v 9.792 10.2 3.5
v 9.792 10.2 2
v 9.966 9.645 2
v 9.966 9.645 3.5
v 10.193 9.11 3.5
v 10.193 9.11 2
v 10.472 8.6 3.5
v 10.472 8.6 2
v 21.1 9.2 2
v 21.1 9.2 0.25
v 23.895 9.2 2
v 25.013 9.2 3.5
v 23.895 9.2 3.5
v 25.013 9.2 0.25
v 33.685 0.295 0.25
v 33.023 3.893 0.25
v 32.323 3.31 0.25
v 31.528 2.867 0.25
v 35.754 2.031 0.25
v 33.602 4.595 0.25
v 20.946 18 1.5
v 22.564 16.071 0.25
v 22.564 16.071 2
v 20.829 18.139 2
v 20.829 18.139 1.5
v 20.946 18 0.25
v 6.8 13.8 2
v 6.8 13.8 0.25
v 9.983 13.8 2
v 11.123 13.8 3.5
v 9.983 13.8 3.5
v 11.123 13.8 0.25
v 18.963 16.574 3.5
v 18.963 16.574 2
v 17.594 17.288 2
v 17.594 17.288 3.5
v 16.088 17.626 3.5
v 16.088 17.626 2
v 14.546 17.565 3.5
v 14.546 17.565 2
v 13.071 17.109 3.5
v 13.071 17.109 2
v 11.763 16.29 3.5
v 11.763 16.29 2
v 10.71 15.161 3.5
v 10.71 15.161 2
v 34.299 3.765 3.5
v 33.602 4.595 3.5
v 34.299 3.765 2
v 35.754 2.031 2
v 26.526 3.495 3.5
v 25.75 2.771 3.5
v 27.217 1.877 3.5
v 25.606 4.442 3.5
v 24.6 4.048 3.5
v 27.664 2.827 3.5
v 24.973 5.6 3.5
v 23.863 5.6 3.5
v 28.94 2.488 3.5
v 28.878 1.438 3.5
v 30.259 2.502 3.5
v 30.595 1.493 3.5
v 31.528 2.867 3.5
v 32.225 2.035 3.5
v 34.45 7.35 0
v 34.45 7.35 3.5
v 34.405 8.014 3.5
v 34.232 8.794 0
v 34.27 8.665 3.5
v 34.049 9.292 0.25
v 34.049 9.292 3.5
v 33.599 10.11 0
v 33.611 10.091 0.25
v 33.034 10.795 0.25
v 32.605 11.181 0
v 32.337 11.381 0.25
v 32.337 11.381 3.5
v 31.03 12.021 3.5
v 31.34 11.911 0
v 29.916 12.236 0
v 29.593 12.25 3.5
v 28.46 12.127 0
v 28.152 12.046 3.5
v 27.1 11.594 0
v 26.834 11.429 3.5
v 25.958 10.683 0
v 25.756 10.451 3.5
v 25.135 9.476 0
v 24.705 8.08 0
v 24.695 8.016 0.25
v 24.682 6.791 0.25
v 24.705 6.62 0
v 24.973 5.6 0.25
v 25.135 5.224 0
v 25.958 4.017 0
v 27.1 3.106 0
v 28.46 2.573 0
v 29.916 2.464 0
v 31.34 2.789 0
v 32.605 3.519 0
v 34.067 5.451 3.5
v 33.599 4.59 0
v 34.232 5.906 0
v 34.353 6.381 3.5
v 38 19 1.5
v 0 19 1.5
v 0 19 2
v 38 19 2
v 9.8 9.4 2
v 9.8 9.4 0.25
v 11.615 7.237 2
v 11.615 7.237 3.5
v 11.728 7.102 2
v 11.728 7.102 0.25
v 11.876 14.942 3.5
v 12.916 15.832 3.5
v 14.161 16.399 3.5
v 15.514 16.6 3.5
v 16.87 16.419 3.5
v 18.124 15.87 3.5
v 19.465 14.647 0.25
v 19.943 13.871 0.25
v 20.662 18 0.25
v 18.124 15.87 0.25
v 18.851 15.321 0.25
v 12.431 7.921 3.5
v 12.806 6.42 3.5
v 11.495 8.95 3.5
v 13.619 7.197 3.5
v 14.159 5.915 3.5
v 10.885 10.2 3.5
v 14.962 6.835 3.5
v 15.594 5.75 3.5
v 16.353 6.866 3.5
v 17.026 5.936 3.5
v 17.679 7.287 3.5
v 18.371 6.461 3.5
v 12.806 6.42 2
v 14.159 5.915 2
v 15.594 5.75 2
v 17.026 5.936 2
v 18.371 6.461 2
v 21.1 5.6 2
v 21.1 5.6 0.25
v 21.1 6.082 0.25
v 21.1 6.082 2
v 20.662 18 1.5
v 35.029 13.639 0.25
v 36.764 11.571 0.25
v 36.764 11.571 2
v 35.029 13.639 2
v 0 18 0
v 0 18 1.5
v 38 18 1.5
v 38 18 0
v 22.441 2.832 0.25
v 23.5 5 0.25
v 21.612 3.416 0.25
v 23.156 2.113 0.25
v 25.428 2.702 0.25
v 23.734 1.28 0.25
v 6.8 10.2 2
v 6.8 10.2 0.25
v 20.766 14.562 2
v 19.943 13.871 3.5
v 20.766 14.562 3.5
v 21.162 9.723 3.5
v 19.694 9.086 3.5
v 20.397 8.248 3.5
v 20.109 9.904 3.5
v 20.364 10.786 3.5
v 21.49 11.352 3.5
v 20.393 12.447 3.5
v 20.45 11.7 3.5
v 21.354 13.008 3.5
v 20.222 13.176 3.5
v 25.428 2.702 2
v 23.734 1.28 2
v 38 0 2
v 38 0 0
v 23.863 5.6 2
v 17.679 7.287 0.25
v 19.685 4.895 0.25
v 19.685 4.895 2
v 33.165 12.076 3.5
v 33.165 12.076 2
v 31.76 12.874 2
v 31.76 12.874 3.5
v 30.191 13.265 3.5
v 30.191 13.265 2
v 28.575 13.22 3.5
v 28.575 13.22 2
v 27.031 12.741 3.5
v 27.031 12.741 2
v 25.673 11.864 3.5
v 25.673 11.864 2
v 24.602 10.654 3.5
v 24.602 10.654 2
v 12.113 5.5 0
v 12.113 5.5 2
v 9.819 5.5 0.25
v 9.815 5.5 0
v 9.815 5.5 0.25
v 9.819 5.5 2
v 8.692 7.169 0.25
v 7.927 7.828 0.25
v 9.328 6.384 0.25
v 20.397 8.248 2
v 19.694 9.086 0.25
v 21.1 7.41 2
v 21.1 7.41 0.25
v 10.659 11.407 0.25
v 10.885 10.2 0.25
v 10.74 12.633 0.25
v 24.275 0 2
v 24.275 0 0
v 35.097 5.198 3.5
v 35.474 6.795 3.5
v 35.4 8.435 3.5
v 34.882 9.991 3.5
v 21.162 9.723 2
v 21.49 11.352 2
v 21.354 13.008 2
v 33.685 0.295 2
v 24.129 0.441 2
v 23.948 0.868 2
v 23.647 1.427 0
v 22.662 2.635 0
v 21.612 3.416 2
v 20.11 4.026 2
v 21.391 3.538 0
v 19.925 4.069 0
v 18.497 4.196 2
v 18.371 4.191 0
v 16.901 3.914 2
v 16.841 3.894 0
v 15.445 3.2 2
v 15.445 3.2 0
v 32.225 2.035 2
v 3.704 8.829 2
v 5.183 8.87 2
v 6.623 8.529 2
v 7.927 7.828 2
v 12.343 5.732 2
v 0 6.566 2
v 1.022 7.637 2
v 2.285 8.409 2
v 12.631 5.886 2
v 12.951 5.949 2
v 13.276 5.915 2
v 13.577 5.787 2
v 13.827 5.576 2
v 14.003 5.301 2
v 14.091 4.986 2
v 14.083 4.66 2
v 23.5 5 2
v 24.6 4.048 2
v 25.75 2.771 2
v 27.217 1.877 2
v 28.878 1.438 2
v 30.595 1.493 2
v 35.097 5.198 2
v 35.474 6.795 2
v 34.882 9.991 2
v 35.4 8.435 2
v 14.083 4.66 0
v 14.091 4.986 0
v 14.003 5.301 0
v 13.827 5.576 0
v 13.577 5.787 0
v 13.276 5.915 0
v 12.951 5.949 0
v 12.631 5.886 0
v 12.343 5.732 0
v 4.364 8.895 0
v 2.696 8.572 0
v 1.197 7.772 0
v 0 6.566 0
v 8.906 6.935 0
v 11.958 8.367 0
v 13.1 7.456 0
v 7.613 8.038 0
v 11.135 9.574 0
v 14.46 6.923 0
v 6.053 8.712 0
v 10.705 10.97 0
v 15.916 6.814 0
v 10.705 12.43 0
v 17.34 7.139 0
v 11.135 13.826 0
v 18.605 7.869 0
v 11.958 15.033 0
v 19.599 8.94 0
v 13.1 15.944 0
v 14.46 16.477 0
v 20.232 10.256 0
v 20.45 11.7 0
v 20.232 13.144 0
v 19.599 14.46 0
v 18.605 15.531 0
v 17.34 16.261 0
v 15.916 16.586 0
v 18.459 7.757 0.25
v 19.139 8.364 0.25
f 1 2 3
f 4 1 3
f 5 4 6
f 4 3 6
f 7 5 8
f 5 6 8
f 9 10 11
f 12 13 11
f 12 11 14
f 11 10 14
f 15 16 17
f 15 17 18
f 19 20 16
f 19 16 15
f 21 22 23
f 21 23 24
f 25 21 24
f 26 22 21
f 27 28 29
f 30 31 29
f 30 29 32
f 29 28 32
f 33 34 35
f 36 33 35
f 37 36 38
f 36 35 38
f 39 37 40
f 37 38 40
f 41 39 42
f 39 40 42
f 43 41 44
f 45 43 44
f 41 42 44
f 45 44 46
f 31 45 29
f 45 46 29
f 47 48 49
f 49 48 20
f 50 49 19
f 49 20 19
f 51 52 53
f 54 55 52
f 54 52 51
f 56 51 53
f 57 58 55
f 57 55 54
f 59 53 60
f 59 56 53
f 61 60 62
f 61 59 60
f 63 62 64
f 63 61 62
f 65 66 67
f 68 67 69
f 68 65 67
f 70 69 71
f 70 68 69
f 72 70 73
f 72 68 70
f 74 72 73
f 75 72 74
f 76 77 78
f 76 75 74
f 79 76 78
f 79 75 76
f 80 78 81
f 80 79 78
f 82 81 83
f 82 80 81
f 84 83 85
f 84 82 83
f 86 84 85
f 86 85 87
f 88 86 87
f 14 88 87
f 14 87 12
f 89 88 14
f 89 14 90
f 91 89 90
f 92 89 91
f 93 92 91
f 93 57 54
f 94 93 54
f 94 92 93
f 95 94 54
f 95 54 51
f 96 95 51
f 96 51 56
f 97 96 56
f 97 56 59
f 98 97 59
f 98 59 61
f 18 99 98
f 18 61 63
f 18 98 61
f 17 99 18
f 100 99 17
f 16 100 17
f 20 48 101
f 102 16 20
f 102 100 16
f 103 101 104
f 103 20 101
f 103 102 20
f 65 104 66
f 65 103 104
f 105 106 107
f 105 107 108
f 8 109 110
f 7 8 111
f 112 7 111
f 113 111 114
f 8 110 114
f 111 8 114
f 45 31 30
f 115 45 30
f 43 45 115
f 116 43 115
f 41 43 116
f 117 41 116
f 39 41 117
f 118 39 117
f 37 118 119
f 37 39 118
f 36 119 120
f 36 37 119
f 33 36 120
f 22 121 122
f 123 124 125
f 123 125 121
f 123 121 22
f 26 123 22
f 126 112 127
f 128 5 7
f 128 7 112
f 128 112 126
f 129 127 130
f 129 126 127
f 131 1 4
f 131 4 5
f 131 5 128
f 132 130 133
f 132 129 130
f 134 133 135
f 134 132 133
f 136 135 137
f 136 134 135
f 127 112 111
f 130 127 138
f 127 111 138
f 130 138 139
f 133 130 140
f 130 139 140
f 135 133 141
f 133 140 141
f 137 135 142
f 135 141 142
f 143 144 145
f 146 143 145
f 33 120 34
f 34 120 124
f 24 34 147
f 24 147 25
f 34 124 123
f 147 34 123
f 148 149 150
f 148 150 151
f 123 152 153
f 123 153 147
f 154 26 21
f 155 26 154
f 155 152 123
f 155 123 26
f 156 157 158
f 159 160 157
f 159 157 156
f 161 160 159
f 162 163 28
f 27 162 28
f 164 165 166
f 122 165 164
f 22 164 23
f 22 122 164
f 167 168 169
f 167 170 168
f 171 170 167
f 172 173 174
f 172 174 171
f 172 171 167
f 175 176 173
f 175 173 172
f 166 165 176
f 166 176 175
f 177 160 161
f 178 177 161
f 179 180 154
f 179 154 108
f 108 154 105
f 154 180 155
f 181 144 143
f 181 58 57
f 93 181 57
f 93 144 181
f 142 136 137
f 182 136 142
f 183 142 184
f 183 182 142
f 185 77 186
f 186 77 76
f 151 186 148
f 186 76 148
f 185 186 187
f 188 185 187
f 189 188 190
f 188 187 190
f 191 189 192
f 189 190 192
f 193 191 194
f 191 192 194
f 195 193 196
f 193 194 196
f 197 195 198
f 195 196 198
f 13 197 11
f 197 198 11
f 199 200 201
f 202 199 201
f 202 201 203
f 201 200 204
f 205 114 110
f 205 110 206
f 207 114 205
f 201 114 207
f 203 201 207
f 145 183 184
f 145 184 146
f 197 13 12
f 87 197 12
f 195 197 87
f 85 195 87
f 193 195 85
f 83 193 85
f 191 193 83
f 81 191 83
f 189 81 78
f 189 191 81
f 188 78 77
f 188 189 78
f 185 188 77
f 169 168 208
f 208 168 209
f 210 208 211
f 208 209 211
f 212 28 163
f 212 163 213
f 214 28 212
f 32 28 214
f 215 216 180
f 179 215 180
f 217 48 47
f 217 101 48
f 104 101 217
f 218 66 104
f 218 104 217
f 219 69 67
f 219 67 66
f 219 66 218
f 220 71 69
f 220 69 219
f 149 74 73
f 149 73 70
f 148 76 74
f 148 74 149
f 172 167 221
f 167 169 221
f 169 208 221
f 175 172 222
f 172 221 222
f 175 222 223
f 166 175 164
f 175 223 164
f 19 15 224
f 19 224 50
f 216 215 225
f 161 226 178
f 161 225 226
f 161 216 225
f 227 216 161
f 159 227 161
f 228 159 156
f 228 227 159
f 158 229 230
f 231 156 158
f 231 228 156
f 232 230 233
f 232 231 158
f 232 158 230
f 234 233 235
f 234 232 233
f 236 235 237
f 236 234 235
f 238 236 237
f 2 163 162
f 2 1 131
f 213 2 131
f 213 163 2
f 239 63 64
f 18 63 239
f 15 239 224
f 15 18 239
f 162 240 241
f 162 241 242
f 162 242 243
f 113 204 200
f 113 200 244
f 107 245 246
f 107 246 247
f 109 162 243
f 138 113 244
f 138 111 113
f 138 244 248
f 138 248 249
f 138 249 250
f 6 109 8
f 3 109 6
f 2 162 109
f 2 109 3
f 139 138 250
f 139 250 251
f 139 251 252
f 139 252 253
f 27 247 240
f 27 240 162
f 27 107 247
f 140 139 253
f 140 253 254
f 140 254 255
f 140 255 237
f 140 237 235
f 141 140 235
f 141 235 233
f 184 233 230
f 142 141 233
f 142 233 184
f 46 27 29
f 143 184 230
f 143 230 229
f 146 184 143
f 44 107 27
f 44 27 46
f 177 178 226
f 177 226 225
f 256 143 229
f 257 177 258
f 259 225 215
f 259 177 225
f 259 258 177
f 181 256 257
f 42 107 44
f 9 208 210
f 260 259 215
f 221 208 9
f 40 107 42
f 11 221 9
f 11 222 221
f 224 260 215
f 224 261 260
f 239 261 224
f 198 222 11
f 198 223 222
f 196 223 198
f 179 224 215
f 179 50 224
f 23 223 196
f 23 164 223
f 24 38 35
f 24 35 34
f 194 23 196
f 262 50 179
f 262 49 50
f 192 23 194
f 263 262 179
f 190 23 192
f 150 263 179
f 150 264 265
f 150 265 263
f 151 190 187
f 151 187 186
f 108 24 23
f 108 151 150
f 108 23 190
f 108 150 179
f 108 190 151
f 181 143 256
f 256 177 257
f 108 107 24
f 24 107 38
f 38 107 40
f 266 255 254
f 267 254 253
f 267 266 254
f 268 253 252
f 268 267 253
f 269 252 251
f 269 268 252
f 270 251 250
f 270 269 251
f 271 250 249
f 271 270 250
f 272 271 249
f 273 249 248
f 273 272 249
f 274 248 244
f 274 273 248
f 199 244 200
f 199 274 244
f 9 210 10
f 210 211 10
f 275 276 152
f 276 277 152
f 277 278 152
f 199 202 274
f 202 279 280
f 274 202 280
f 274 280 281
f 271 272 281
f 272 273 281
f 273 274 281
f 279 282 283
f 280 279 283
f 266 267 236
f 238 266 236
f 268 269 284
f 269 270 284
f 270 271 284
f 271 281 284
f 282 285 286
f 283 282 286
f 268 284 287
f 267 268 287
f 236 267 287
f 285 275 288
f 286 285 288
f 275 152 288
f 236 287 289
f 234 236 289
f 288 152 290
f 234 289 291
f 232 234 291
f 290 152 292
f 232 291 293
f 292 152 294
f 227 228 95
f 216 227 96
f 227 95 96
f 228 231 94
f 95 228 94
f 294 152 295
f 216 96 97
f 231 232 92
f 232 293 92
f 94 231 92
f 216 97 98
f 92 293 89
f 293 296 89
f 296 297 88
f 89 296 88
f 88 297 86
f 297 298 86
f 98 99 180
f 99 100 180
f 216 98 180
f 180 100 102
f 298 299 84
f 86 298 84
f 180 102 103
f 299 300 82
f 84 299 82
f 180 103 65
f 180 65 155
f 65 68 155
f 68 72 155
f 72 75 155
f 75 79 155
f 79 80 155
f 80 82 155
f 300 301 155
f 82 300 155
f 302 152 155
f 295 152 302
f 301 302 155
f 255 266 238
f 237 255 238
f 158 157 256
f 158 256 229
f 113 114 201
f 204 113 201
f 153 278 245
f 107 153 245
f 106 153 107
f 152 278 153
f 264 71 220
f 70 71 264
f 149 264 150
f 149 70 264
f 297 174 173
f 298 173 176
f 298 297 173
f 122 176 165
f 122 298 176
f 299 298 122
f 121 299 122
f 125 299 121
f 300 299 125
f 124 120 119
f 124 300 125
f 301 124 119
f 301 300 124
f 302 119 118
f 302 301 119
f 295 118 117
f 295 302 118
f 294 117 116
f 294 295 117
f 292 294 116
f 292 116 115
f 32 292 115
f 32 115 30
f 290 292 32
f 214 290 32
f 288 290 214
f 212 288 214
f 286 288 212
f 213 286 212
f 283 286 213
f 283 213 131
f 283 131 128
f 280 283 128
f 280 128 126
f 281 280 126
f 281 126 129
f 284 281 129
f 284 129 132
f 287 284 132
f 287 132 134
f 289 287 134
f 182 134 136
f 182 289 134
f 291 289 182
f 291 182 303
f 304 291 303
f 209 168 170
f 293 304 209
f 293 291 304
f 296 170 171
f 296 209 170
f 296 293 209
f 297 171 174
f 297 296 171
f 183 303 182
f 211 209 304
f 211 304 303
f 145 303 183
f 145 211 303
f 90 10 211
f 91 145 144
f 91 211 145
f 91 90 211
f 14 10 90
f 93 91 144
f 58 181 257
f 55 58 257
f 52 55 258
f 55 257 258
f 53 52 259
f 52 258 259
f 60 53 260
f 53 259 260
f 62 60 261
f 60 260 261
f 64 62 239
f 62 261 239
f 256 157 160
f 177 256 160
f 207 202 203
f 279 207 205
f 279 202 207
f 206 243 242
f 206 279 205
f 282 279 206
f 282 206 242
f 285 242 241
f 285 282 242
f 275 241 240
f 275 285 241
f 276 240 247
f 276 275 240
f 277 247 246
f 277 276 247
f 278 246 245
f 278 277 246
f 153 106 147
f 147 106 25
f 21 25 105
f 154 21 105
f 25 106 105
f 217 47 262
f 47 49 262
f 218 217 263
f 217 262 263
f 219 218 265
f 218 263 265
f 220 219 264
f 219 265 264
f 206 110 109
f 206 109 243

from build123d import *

# Parameters (mm, degrees)
CYLINDER009_R          = 1.1
CYLINDER009_DEPTH      = 10
CYLINDER008_W          = 7
CYLINDER008_H          = 10
CYLINDER008_ANGLE      = 133
BOX008_W               = 4.5
BOX008_H               = 3.6
BOX008_DEPTH           = 10
BOX009_W               = 4.5
BOX009_H               = 3.6
BOX009_DEPTH           = 10
BOX005_W               = 3.4
BOX005_H               = 2.7
BOX005_DEPTH           = 3.5
BOX005_PLACEMENT_ANGLE = 50
BOX006_W               = 4
BOX006_H               = 2.7
BOX006_DEPTH           = 3.5
BOX006_PLACEMENT_ANGLE = 40
BOX004_W               = 3
BOX004_H               = 3
BOX004_DEPTH           = 3.5
BOX004_PLACEMENT_ANGLE = 220
BOX003_W               = 3
BOX003_H               = 3
BOX003_DEPTH           = 3.5
BOX003_PLACEMENT_ANGLE = 220
BOX001_W               = 3.4
BOX001_H               = 2.7
BOX001_DEPTH           = 3.5
BOX001_PLACEMENT_ANGLE = 50
BOX002_W               = 4
BOX002_H               = 2.7
BOX002_DEPTH           = 3.5
BOX002_PLACEMENT_ANGLE = 40
CYLINDER003_R          = 4.9
CYLINDER003_DEPTH      = 10
CYLINDER002_R          = 5.8
CYLINDER002_DEPTH      = 10
CYLINDER001_R          = 4.9
CYLINDER001_DEPTH      = 10
CYLINDER_R             = 5.7
CYLINDER_DEPTH         = 10
BOX007_W               = 38
BOX007_H               = 2
BOX007_DEPTH           = 1.5
CYLINDER004_R          = 5.95
CYLINDER004_DEPTH      = 3.5
BOX_W                  = 38
BOX_H                  = 19
BOX_DEPTH              = 2
CYLINDER005_R          = 5.95
CYLINDER005_DEPTH      = 3.5


with BuildPart() as cylinder009:
    # Cylinder009 → Cylinder009 (new body)
    with BuildSketch(Plane(origin=(13, 4.85, 0), x_dir=(1, 0, 0), z_dir=(0, 0, 1))):
        Circle(CYLINDER009_R)
    extrude(amount=CYLINDER009_DEPTH)


with BuildPart() as fusion002:
    # Cylinder008 → Cylinder008 (revolve)
    with BuildSketch(Plane(origin=(13.3, 5.5, 0), x_dir=(-1, 0, 0), z_dir=(0, 1, 0))):
        with Locations((3.5, 5)):
            Rectangle(CYLINDER008_W, CYLINDER008_H)
    revolve(axis=Axis((13.3, 5.5, 0), (0, 0, 1)), revolution_arc=CYLINDER008_ANGLE)

    # Fusion002: union Cylinder009
    add(cylinder009.part)


with BuildPart() as cube001_x_button_well_left_cutter:
    # Box008 → Box008 (new body)
    with BuildSketch(Plane(origin=(6.8, 10.2, 0.25), x_dir=(1, 0, 0), z_dir=(0, 0, 1))):
        with Locations((2.25, 1.8)):
            Rectangle(BOX008_W, BOX008_H)
    extrude(amount=BOX008_DEPTH)


with BuildPart() as cube002_y_button_well_left_cutter:
    # Box009 → Box009 (new body)
    with BuildSketch(Plane(origin=(21.1, 5.6, 0.25), x_dir=(1, 0, 0), z_dir=(0, 0, 1))):
        with Locations((2.25, 1.8)):
            Rectangle(BOX009_W, BOX009_H)
    extrude(amount=BOX009_DEPTH)


with BuildPart() as box005:
    # Box005 → Box005 (new body)
    with BuildSketch(Plane.XY):
        with Locations((1.7, 1.35)):
            Rectangle(BOX005_W, BOX005_H)
    extrude(amount=BOX005_DEPTH)


with BuildPart() as box005_1:
    # Box005 placement: moved
    add(box005.part.moved(Location((17.5, 7.5, 0.25))).rotate(Axis((17.5, 7.5, 0.25), (0, 0, -1)), BOX005_PLACEMENT_ANGLE))


with BuildPart() as box006:
    # Box006 → Box006 (new body)
    with BuildSketch(Plane.XY):
        with Locations((2, 1.35)):
            Rectangle(BOX006_W, BOX006_H)
    extrude(amount=BOX006_DEPTH)


with BuildPart() as box006_1:
    # Box006 placement: moved
    add(box006.part.moved(Location((33.7, 9, 0.25))).rotate(Axis((33.7, 9, 0.25), (0, 0, 1)), BOX006_PLACEMENT_ANGLE))


with BuildPart() as cube001_a_button_well_cutter:
    # Box004 → Box004 (new body)
    with BuildSketch(Plane.XY):
        with Locations((1.5, 1.5)):
            Rectangle(BOX004_W, BOX004_H)
    extrude(amount=BOX004_DEPTH)


with BuildPart() as cube001_a_button_well_cutter_1:
    # Box004 placement: moved
    add(cube001_a_button_well_cutter.part.moved(Location((9.8, 9.4, 0.25))).rotate(Axis((9.8, 9.4, 0.25), (0, 0, 1)), BOX004_PLACEMENT_ANGLE))


with BuildPart() as cube001_b_button_well_cutter:
    # Box003 → Box003 (new body)
    with BuildSketch(Plane.XY):
        with Locations((1.5, 1.5)):
            Rectangle(BOX003_W, BOX003_H)
    extrude(amount=BOX003_DEPTH)


with BuildPart() as cube001_b_button_well_cutter_1:
    # Box003 placement: moved
    add(cube001_b_button_well_cutter.part.moved(Location((23.5, 5, 0.25))).rotate(Axis((23.5, 5, 0.25), (0, 0, 1)), BOX003_PLACEMENT_ANGLE))


with BuildPart() as box001:
    # Box001 → Box001 (new body)
    with BuildSketch(Plane.XY):
        with Locations((1.7, 1.35)):
            Rectangle(BOX001_W, BOX001_H)
    extrude(amount=BOX001_DEPTH)


with BuildPart() as box001_1:
    # Box001 placement: moved
    add(box001.part.moved(Location((31.5, 2.9, 0.25))).rotate(Axis((31.5, 2.9, 0.25), (0, 0, -1)), BOX001_PLACEMENT_ANGLE))


with BuildPart() as cube001_y_button_well_right_top_cutter:
    # Box002 → Box002 (new body)
    with BuildSketch(Plane.XY):
        with Locations((2, 1.35)):
            Rectangle(BOX002_W, BOX002_H)
    extrude(amount=BOX002_DEPTH)


with BuildPart() as cube001_y_button_well_right_top_cutter_1:
    # Box002 placement: moved
    add(cube001_y_button_well_right_top_cutter.part.moved(Location((19.5, 13.5, 0.25))).rotate(Axis((19.5, 13.5, 0.25), (0, 0, 1)), BOX002_PLACEMENT_ANGLE))


with BuildPart() as cylinder_y_button_well_inner:
    # Cylinder003 → Cylinder003 (new body)
    with BuildSketch(Plane(origin=(29.55, 7.35, 0), x_dir=(1, 0, 0), z_dir=(0, 0, 1))):
        Circle(CYLINDER003_R)
    extrude(amount=CYLINDER003_DEPTH)


with BuildPart() as cylinder_b_button_well_inner:
    # Cylinder002 → Cylinder002 (new body)
    with BuildSketch(Plane(origin=(18.7, -1.6, 0), x_dir=(1, 0, 0), z_dir=(0, 0, 1))):
        Circle(CYLINDER002_R)
    extrude(amount=CYLINDER002_DEPTH)


with BuildPart() as cylinder_x_button_well_inner:
    # Cylinder001 → Cylinder001 (new body)
    with BuildSketch(Plane(origin=(15.55, 11.7, 0), x_dir=(1, 0, 0), z_dir=(0, 0, 1))):
        Circle(CYLINDER001_R)
    extrude(amount=CYLINDER001_DEPTH)


with BuildPart() as cylinder_a_button_well_inner:
    # Cylinder → Cylinder (new body)
    with BuildSketch(Plane(origin=(4.6, 3.2, 0), x_dir=(1, 0, 0), z_dir=(0, 0, 1))):
        Circle(CYLINDER_R)
    extrude(amount=CYLINDER_DEPTH)


with BuildPart() as fusion001:
    # Box007 → Box007 (new body)
    with BuildSketch(Plane(origin=(0, 18, 0), x_dir=(1, 0, 0), z_dir=(0, 0, 1))):
        with Locations((19, 1)):
            Rectangle(BOX007_W, BOX007_H)
    extrude(amount=BOX007_DEPTH)

    # Fusion001: union Cube001(x_button_well_left_cutter), Cube002(y_button_well_left_cutter), Box005, Box006, Cube001(a_button_well_cutter), Cube001(b_button_well_cutter), Box001, Cube001(y_button_well_right_top_cutter), Cylinder(y_button_well_inner), Cylinder(b_button_well_inner), Cylinder(x_button_well_inner), Cylinder(a_button_well_inner)
    add(cube001_x_button_well_left_cutter.part)
    add(cube002_y_button_well_left_cutter.part)
    add(box005_1.part)
    add(box006_1.part)
    add(cube001_a_button_well_cutter_1.part)
    add(cube001_b_button_well_cutter_1.part)
    add(box001_1.part)
    add(cube001_y_button_well_right_top_cutter_1.part)
    add(cylinder_y_button_well_inner.part)
    add(cylinder_b_button_well_inner.part)
    add(cylinder_x_button_well_inner.part)
    add(cylinder_a_button_well_inner.part)


with BuildPart() as cylinder_x_button_well_outer:
    # Cylinder004 → Cylinder004 (new body)
    with BuildSketch(Plane(origin=(15.55, 11.7, 0), x_dir=(1, 0, 0), z_dir=(0, 0, 1))):
        Circle(CYLINDER004_R)
    extrude(amount=CYLINDER004_DEPTH)


with BuildPart() as cube:
    # Box → Box (new body)
    with BuildSketch(Plane.XY):
        with Locations((19, 9.5)):
            Rectangle(BOX_W, BOX_H)
    extrude(amount=BOX_DEPTH)


with BuildPart() as cut001:
    # Cylinder005 → Cylinder005 (new body)
    with BuildSketch(Plane(origin=(29.55, 7.35, 0), x_dir=(1, 0, 0), z_dir=(0, 0, 1))):
        Circle(CYLINDER005_R)
    extrude(amount=CYLINDER005_DEPTH)

    # Fusion: union Cylinder(x_button_well_outer), Cube
    add(cylinder_x_button_well_outer.part)
    add(cube.part)

    # Cut: cut Fusion001
    add(fusion001.part, mode=Mode.SUBTRACT)

    # Cut001: cut Fusion002
    add(fusion002.part, mode=Mode.SUBTRACT)


solid = cut001.part
